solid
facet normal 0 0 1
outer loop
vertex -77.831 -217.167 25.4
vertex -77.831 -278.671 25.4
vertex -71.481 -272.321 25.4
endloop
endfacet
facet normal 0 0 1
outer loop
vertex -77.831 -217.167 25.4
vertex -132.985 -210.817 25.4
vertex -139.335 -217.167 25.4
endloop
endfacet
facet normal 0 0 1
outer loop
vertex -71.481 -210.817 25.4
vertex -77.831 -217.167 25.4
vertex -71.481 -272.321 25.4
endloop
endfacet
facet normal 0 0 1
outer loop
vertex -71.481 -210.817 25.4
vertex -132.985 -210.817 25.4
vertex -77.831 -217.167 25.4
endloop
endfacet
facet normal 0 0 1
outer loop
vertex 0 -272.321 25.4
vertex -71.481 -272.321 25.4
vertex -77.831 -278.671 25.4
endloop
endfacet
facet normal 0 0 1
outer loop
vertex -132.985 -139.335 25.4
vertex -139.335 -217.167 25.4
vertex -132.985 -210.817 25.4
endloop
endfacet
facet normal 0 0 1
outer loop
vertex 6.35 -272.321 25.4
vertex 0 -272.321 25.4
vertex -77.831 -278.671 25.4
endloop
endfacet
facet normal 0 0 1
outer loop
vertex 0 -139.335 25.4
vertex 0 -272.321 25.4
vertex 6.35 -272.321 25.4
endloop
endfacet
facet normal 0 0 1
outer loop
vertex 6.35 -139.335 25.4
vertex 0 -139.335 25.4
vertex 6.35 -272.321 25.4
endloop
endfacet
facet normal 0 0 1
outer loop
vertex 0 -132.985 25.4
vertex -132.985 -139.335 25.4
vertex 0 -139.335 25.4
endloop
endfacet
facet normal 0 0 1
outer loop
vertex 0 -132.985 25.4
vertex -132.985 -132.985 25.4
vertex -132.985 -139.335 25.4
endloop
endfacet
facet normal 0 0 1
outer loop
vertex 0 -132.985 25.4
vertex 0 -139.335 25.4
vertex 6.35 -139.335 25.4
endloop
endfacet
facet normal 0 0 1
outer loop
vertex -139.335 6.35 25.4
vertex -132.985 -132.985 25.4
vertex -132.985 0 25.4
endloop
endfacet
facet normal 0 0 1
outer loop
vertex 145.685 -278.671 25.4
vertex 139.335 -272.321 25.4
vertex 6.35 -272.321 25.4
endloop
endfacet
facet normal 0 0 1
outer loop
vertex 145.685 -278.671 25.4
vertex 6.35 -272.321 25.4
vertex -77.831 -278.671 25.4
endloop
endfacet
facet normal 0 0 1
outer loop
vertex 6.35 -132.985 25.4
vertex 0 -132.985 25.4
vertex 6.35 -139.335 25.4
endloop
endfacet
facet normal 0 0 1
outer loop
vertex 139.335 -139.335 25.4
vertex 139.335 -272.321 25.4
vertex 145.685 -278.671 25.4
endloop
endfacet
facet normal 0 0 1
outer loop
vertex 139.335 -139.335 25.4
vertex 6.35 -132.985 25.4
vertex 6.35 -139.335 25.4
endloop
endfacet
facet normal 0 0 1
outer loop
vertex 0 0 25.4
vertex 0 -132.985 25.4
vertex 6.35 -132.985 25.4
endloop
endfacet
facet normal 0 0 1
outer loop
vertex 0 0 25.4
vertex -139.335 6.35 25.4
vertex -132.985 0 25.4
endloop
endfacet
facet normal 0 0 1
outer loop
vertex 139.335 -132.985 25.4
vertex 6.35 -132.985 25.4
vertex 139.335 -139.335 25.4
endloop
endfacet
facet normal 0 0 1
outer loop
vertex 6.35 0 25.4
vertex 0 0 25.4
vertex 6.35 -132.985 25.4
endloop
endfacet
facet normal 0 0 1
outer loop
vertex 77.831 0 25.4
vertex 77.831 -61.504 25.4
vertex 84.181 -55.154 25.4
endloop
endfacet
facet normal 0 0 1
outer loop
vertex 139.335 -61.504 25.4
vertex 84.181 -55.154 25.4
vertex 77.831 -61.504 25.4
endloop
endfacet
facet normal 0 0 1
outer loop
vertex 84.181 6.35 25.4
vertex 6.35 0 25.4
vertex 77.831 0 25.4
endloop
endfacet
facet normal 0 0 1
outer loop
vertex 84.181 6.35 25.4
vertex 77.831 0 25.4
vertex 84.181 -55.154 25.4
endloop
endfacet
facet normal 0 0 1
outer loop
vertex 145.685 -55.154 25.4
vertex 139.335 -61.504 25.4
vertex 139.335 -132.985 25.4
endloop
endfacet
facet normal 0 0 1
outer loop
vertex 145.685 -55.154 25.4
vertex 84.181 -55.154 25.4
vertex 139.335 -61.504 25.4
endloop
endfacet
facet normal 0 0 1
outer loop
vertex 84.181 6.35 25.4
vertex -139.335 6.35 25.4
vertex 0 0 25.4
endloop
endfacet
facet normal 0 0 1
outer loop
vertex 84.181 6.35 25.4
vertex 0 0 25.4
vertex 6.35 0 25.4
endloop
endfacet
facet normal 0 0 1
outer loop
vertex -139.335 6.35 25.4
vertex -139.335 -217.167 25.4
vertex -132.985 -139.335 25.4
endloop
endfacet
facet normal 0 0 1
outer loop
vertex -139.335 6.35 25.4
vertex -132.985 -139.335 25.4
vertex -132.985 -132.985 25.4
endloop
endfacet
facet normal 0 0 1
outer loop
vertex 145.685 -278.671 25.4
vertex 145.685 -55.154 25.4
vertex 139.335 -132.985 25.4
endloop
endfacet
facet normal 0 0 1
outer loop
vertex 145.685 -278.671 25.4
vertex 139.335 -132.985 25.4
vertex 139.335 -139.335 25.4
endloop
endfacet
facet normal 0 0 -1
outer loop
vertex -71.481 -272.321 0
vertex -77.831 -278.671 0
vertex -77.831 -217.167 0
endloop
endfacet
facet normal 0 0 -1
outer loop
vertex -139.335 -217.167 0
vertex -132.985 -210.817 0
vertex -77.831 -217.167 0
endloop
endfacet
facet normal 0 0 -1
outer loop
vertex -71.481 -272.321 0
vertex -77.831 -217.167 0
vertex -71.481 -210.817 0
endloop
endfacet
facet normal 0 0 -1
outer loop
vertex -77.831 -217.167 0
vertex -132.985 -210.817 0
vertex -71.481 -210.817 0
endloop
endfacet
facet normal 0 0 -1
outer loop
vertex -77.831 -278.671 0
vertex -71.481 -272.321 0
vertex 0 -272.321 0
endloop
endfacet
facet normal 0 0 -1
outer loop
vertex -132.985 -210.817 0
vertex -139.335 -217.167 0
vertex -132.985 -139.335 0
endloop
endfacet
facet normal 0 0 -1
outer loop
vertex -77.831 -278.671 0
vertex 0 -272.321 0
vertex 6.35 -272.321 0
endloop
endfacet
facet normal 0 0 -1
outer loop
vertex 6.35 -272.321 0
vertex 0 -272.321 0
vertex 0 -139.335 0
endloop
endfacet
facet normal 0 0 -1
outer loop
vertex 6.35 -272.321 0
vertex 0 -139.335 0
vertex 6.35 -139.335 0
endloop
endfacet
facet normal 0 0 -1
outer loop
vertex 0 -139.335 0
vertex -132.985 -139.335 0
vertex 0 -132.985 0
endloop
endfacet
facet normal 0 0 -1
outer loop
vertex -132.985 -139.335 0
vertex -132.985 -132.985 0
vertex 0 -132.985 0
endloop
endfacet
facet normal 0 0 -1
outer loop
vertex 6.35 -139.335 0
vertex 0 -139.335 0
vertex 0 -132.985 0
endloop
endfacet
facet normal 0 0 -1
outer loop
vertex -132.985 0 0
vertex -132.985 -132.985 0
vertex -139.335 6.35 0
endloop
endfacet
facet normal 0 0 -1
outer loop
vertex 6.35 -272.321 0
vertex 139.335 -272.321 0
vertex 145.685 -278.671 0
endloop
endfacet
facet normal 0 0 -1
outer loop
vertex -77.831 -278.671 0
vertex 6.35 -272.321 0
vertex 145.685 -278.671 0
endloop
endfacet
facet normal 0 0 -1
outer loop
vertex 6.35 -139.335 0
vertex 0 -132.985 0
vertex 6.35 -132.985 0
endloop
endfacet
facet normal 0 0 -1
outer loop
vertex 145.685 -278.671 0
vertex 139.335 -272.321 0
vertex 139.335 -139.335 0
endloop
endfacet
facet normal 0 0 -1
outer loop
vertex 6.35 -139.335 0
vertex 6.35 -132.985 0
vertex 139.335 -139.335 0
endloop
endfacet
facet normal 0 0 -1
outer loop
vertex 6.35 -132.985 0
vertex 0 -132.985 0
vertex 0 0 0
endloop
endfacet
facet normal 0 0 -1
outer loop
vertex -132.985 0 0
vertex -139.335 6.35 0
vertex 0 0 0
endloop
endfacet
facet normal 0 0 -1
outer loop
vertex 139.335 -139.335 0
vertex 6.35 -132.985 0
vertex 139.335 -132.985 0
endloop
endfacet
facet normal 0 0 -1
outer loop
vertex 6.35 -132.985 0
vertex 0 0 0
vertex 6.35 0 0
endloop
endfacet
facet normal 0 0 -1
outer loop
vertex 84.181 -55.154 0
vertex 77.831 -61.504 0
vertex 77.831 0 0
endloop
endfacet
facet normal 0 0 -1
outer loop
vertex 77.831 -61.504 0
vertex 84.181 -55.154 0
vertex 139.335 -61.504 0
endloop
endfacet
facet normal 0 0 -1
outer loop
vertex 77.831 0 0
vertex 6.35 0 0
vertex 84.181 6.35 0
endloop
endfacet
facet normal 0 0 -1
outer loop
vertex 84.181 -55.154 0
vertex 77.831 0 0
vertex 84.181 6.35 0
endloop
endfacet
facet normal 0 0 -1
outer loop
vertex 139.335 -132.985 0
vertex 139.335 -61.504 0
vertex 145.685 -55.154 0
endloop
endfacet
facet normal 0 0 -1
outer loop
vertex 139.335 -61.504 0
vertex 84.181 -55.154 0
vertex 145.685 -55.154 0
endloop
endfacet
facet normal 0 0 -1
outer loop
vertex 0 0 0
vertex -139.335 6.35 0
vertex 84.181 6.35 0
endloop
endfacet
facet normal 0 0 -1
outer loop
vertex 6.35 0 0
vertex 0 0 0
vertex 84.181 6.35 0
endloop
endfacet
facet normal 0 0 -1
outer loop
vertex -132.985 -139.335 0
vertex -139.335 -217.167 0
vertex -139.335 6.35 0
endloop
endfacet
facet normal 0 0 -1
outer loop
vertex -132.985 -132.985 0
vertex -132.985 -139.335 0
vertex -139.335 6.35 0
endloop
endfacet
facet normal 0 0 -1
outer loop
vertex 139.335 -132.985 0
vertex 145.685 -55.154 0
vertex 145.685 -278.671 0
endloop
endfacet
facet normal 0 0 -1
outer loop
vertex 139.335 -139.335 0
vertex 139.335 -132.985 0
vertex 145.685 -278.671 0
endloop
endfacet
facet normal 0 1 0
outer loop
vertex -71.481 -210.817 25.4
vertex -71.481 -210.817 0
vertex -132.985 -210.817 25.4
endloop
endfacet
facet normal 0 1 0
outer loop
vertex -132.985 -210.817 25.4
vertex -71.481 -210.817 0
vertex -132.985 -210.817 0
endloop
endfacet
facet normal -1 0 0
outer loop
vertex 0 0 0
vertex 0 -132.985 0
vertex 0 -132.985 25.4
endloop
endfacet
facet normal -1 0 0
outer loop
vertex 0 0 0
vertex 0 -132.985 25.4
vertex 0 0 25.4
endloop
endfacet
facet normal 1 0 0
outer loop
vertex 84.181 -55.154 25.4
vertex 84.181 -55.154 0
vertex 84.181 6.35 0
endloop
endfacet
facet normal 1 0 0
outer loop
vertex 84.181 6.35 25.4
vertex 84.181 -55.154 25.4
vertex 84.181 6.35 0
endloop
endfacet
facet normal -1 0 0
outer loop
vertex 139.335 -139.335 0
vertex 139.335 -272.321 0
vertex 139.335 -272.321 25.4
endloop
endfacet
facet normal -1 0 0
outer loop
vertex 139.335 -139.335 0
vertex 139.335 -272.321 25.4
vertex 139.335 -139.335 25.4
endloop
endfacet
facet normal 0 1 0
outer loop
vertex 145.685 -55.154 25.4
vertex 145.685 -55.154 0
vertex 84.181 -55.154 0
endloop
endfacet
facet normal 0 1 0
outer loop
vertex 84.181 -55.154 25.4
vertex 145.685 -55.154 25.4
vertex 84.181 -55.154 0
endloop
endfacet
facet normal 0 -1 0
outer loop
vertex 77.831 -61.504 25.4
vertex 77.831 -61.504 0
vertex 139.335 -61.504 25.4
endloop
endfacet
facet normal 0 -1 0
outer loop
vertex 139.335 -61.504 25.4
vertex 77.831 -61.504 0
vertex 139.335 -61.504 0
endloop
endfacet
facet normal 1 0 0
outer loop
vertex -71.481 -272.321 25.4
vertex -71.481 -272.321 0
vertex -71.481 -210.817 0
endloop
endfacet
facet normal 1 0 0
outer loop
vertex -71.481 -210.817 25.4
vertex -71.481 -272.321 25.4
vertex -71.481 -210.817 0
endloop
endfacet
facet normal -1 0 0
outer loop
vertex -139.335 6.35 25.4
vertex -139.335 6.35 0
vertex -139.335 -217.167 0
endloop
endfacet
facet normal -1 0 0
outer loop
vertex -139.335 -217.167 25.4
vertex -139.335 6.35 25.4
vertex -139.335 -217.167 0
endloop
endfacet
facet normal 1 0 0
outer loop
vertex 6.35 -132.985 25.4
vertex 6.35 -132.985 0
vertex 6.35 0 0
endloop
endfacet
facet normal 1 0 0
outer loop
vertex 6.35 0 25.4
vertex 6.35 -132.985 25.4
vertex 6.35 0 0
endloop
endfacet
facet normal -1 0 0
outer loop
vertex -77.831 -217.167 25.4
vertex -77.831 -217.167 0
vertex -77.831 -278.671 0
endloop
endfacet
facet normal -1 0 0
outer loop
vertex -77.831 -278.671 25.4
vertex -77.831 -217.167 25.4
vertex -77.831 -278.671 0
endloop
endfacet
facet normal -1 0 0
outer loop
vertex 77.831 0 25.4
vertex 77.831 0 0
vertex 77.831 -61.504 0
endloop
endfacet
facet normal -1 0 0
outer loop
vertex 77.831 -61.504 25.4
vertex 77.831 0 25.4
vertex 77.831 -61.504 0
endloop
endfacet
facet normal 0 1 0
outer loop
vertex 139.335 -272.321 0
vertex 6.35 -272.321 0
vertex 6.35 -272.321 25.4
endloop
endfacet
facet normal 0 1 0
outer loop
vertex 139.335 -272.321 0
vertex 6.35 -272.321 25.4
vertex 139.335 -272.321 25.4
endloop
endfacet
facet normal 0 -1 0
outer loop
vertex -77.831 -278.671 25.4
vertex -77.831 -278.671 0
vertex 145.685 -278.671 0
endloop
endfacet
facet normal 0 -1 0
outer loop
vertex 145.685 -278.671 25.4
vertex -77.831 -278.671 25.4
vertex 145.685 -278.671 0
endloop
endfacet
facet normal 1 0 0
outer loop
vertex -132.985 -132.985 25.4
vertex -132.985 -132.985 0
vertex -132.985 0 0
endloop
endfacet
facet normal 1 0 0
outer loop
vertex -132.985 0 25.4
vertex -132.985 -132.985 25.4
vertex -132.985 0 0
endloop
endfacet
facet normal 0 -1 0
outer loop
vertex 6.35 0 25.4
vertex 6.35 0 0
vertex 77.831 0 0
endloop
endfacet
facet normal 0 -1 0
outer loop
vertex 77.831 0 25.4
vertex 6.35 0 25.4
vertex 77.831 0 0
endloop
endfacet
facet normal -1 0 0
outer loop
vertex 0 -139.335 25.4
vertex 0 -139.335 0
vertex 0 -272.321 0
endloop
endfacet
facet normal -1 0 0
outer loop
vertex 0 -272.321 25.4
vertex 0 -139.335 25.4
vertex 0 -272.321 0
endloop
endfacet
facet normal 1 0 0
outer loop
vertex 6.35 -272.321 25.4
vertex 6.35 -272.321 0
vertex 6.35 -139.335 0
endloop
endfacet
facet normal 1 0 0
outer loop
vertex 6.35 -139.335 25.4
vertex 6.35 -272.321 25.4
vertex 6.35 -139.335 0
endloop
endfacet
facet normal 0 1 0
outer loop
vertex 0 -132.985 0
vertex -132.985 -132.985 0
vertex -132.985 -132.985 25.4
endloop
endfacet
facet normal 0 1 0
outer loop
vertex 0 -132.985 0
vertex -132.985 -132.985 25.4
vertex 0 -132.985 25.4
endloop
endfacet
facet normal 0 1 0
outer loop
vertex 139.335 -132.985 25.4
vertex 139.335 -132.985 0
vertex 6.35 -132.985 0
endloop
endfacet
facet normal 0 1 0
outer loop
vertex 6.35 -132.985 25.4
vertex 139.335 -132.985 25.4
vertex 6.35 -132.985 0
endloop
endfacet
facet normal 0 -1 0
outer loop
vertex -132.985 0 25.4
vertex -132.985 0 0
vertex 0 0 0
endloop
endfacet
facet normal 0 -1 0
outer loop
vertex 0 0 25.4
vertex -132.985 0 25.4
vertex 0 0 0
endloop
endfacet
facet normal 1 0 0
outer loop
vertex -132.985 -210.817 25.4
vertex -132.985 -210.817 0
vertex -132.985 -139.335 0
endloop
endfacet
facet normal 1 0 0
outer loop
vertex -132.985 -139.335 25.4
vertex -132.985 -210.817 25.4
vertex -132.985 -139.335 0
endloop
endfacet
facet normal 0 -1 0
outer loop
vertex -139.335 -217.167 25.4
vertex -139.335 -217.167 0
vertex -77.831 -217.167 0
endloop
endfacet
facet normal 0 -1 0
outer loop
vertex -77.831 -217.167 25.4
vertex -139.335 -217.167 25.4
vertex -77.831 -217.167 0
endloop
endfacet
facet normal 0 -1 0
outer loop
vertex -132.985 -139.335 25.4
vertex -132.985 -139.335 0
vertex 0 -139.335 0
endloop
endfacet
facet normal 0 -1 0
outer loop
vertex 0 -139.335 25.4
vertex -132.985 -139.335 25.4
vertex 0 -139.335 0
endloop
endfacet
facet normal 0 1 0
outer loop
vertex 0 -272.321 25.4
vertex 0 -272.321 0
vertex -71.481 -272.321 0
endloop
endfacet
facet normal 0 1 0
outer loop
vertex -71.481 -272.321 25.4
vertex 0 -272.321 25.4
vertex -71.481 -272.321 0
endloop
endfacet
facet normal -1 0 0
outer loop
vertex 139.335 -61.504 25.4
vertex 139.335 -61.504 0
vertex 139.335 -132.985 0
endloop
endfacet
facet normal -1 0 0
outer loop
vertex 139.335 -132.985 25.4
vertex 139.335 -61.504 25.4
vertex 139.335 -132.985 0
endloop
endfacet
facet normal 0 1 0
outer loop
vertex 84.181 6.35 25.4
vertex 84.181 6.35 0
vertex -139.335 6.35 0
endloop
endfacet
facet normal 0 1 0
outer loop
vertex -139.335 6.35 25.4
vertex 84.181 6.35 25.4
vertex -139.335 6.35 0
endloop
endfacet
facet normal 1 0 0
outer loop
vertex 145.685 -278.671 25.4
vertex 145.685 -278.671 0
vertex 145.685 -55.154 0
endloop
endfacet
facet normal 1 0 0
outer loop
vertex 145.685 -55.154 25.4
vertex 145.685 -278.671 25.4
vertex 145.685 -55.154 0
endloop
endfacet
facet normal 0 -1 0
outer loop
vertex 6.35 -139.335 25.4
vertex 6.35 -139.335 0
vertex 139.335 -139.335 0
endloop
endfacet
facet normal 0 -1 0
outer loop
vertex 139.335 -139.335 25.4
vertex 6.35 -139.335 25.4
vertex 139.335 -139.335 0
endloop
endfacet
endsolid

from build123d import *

# Parameters (mm, degrees)
F0_W     = 132.985286
F0_H     = 132.985286
F1_DEPTH = 25.4


with BuildPart() as f1:
    # F0 (on Top) → F1 (new body)
    with BuildSketch(Plane.XY):
        Polygon((84.181237, -55.154049), (84.181237, 6.35), (-139.335286, 6.35), (-139.335286, -217.166522), (-77.831237, -217.166522), (-77.831237, -278.670572), (145.685286, -278.670572), (145.685286, -55.154049), align=None)
        Polygon((0, -272.320572), (-71.481237, -272.320572), (-71.481237, -210.816522), (-132.985286, -210.816522), (-132.985286, -139.335286), (0, -139.335286), align=None, mode=Mode.SUBTRACT)
        with Locations((72.842643, -205.827929)):
            Rectangle(F0_W, F0_H, mode=Mode.SUBTRACT)
        with Locations((-66.492643, -66.492643)):
            Rectangle(F0_W, F0_H, mode=Mode.SUBTRACT)
        Polygon((6.35, -132.985286), (6.35, 0), (77.831237, 0), (77.831237, -61.504049), (139.335286, -61.504049), (139.335286, -132.985286), align=None, mode=Mode.SUBTRACT)
    extrude(amount=F1_DEPTH)


solid = f1.part
